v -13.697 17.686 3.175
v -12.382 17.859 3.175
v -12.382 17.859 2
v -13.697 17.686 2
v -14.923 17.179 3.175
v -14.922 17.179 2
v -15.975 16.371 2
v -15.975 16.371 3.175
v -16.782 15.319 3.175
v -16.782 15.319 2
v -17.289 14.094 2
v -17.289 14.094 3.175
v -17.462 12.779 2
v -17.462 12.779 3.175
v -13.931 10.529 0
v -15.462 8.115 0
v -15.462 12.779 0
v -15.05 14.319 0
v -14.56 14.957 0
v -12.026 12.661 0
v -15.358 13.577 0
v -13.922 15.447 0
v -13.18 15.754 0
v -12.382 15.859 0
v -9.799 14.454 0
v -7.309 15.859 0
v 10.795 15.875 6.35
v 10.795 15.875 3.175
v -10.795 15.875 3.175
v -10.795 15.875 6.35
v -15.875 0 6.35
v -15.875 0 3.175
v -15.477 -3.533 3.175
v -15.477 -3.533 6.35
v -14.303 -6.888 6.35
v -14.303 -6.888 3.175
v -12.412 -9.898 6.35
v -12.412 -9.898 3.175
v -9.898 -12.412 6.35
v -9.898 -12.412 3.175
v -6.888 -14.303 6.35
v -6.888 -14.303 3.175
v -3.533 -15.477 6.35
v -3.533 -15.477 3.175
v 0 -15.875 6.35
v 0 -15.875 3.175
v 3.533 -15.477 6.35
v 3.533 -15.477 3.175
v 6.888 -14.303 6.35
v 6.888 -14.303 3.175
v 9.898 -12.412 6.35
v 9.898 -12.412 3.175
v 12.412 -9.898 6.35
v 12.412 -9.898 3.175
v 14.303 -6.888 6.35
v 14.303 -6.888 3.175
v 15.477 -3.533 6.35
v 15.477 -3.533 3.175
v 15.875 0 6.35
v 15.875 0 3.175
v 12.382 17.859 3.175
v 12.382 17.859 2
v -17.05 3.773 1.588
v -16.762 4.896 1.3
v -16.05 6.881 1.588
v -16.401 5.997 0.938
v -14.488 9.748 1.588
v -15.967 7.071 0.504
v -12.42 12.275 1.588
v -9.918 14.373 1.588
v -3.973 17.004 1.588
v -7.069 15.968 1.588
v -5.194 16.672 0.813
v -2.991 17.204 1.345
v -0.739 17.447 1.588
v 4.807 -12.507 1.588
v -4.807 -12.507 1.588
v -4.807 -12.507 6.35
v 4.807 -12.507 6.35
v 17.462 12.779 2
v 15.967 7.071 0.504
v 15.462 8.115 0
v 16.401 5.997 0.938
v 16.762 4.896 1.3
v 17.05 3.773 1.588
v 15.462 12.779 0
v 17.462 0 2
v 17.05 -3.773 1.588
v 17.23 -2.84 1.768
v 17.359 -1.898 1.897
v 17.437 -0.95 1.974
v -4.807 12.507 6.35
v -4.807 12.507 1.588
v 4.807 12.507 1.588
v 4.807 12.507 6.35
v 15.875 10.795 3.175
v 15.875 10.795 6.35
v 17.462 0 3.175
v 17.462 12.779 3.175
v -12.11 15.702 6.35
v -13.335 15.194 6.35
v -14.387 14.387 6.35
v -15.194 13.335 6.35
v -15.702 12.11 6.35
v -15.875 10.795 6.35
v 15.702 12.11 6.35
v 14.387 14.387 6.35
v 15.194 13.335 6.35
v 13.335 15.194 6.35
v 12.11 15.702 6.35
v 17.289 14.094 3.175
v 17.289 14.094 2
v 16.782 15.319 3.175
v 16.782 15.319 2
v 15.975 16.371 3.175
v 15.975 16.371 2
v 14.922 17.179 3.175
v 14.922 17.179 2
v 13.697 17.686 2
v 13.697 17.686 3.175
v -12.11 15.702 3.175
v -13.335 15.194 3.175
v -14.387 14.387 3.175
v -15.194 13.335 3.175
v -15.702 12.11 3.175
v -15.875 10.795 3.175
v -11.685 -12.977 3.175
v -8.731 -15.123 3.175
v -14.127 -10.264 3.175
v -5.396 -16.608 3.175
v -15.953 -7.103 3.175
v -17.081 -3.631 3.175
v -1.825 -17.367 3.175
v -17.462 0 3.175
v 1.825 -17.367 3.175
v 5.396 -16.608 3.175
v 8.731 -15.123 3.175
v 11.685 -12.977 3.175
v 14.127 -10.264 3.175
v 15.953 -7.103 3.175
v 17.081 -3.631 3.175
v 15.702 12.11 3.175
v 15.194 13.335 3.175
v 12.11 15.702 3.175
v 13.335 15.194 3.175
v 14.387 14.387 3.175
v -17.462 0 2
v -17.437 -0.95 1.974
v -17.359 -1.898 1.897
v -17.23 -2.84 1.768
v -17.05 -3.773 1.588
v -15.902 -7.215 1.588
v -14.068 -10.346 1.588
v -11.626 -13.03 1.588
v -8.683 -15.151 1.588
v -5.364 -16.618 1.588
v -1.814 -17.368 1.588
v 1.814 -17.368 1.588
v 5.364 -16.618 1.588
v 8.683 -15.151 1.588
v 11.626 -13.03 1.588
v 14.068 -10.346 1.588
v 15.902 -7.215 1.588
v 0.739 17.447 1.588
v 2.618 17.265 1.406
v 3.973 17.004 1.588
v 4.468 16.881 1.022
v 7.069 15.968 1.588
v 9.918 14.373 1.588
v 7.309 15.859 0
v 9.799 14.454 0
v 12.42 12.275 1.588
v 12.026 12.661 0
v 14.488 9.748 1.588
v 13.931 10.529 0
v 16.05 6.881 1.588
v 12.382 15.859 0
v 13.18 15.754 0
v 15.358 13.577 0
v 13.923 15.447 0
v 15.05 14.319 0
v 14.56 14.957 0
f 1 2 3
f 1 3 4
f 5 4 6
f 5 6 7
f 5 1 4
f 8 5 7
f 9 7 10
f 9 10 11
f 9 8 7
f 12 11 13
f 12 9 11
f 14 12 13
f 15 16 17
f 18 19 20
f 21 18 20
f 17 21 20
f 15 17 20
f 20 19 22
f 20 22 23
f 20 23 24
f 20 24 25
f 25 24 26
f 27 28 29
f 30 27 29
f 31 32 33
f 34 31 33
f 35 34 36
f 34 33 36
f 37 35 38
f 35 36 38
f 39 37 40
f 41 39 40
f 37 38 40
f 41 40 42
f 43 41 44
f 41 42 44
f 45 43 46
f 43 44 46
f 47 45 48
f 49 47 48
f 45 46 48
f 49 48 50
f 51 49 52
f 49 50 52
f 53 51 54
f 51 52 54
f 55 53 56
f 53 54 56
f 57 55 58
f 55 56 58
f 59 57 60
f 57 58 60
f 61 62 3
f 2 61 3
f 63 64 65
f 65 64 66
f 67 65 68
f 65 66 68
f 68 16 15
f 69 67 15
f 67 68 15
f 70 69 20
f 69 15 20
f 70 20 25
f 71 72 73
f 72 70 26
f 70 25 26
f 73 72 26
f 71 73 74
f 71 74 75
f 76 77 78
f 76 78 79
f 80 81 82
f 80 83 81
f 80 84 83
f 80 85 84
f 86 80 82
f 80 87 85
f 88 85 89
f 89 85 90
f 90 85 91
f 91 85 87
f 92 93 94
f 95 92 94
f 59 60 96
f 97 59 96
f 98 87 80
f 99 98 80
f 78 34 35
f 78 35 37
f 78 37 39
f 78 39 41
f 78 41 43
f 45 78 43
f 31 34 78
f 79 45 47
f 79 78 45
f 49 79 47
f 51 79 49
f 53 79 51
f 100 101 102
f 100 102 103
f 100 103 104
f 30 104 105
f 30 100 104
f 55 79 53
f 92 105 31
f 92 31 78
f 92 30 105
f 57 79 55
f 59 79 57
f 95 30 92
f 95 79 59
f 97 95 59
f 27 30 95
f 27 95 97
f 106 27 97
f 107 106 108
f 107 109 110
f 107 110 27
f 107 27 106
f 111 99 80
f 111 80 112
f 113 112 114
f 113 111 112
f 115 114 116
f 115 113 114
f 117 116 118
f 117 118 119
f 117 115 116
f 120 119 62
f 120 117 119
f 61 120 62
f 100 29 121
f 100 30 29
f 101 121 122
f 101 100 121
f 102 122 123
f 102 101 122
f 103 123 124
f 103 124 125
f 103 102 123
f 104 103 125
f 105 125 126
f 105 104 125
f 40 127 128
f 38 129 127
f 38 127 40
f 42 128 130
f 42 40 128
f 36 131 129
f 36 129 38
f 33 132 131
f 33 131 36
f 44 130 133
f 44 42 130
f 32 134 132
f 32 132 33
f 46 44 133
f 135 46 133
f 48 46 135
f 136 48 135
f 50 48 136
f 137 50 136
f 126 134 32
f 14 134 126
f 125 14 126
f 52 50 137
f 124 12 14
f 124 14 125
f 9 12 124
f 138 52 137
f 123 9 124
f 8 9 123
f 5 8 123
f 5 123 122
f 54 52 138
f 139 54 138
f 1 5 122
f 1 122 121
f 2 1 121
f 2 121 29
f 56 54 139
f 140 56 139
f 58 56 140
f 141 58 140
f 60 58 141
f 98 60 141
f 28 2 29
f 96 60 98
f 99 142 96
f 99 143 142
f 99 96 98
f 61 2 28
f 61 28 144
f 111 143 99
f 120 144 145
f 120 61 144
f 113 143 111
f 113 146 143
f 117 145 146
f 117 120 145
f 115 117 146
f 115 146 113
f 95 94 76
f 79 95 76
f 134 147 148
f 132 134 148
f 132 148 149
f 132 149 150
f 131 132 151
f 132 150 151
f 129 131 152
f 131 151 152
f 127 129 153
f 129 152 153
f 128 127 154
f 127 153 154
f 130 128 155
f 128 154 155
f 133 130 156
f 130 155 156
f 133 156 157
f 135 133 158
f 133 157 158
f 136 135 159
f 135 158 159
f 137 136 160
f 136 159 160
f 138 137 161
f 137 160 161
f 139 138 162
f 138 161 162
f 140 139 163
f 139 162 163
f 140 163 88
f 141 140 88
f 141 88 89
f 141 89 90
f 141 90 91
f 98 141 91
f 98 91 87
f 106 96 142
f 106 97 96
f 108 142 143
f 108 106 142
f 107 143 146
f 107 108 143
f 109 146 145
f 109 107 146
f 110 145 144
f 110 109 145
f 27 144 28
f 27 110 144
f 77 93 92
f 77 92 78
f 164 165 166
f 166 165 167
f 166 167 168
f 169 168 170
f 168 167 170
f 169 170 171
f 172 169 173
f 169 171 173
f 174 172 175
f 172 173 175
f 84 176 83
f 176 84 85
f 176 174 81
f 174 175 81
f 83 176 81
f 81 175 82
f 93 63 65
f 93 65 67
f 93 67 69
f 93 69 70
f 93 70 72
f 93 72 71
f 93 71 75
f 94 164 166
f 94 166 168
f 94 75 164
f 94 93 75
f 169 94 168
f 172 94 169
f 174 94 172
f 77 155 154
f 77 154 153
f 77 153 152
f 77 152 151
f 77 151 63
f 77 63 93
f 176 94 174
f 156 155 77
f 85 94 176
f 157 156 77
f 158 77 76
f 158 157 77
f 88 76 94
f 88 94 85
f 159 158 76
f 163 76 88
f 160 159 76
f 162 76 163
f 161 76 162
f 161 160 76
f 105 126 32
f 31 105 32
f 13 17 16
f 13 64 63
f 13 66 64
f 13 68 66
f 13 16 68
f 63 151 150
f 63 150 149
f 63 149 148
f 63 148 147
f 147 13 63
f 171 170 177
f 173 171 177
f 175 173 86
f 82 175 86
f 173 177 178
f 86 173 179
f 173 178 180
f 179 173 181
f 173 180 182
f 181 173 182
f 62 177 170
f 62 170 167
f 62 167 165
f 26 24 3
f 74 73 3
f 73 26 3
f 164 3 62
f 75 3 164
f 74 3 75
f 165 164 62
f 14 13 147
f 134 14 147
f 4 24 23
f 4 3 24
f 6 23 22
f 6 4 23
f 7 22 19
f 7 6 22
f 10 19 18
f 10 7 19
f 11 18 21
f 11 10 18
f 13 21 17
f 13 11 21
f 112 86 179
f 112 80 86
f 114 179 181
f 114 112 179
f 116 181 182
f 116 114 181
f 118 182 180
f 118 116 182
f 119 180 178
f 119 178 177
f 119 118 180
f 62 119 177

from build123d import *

# Parameters (mm, degrees)
F1_DEPTH    = 3.175
F3_DEPTH    = 3.175
F5_DEPTH    = 1.5875
F6_W        = 9.6138492227
F6_H        = 25.0137764961
F7_DEPTH    = 25.4
F8_R        = 5.08
F9_T1_DEPTH = 21.5230971591
F9_T3_DEPTH = 24.765
F9_T6_ANGLE = 90
F9_T8_ANGLE = 90


# Not quite as in the source:
# - a fillet or chamfer that OpenCascade refuses, or shapes differently, is made with other operations: its cross-section is extruded or revolved along the edge and cut away or added


with BuildPart() as f1:
    # F0 (on Top) → F1 (new body)
    with BuildSketch(Plane.XY):
        with BuildLine():
            ThreePointArc((-17.4625, 0), (0, -17.4625), (17.4625, 0))
            ThreePointArc((17.4625, 0), (0, 17.4625), (-17.4625, 0))
        make_face()
        with BuildLine():
            ThreePointArc((-17.4625, 0), (0, 17.4625), (17.4625, 0))
            Line((17.4625, 0), (17.4625, 17.859375))
            Line((17.4625, 17.859375), (-17.4625, 17.859375))
            Line((-17.4625, 17.859375), (-17.4625, 0))
        make_face()
    extrude(amount=F1_DEPTH)

    # F2 (on face) → F3 (join)
    with BuildSketch(Plane.XY.offset(3.175)):
        with BuildLine():
            ThreePointArc((-5.44e-08, 15.875), (-11.2253201706, 11.2253201321), (-15.875, 0))
            ThreePointArc((-15.875, 0), (0, -15.875), (15.875, 0))
            ThreePointArc((15.875, 0), (11.2253201321, 11.2253201706), (-5.44e-08, 15.875))
        make_face()
        with BuildLine():
            Line((-15.875, 15.875), (-15.875, 0))
            ThreePointArc((-15.875, 0), (-11.2253201706, 11.2253201321), (-5.44e-08, 15.875))
            Line((-5.44e-08, 15.875), (-15.875, 15.875))
        make_face()
        with BuildLine():
            ThreePointArc((-5.44e-08, 15.875), (11.2253201321, 11.2253201706), (15.875, 0))
            Line((15.875, 0), (15.875, 15.875))
            Line((15.875, 15.875), (-5.44e-08, 15.875))
        make_face()
    extrude(amount=F3_DEPTH)

    # F4 (on face) → F5 (cut)
    with BuildSketch(Plane(origin=(0, 0, 0), x_dir=(1, 0, 0), z_dir=(0, 0, -1))):
        with BuildLine():
            ThreePointArc((-17.4625, 0), (0, -17.4625), (17.4625, 0))
            ThreePointArc((17.4625, 0), (0, 17.4625), (-17.4625, 0))
        make_face()
    extrude(amount=-F5_DEPTH, mode=Mode.SUBTRACT)

    # F6 (on face) → F7 (cut)
    with BuildSketch(Plane(origin=(0, 0, 1.5875), x_dir=(1, 0, 0), z_dir=(0, 0, -1))):
        Rectangle(F6_W, F6_H)
    extrude(amount=-F7_DEPTH, mode=Mode.SUBTRACT)

    # F8
    f8_edges = [f1.edges().sort_by_distance(p)[0] for p in [
        (17.4625, 17.859375, 1.5875),
        (-17.4625, 17.859375, 1.5875),
        (-15.875, 15.875, 4.7625),
        (15.875, 15.875, 4.7625),
    ]]
    fillet(f8_edges, radius=F8_R)

    # F9: chamfer of 2 on 2 edges, made by hand

    # F9_s2 → F9_t1 (cut)
    with BuildSketch(Plane.XZ.offset(-12.779375)):
        Polygon((17.4625, 2), (15.4625, 0), (17.4625, 0), align=None)
        Polygon((-15.4625, 0), (-17.4625, 2), (-17.4625, 0), align=None)
    extrude(amount=F9_T1_DEPTH, mode=Mode.SUBTRACT)

    # F9_s4 → F9_t3 (cut)
    with BuildSketch(Plane.YZ.offset(-12.3825)):
        Polygon((15.859375, 0), (17.859375, 2), (17.859375, 0), align=None)
    extrude(amount=F9_T3_DEPTH, mode=Mode.SUBTRACT)

    # F9_s5 → F9_t6 (revolve, cut)
    with BuildSketch(Plane.XZ.offset(-12.779375)):
        Polygon((15.4625, 0), (17.4625, 2), (17.4625, 0), align=None)
    revolve(axis=Axis((12.3825, 12.779375, 0), (0, 0, 1)), revolution_arc=F9_T6_ANGLE, mode=Mode.SUBTRACT)

    # F9_s7 → F9_t8 (revolve, cut)
    with BuildSketch(Plane.YZ.offset(-12.3825)):
        Polygon((15.859375, 0), (17.859375, 2), (17.859375, 0), align=None)
    revolve(axis=Axis((-12.3825, 12.779375, 0), (0, 0, 1)), revolution_arc=F9_T8_ANGLE, mode=Mode.SUBTRACT)


solid = f1.part
